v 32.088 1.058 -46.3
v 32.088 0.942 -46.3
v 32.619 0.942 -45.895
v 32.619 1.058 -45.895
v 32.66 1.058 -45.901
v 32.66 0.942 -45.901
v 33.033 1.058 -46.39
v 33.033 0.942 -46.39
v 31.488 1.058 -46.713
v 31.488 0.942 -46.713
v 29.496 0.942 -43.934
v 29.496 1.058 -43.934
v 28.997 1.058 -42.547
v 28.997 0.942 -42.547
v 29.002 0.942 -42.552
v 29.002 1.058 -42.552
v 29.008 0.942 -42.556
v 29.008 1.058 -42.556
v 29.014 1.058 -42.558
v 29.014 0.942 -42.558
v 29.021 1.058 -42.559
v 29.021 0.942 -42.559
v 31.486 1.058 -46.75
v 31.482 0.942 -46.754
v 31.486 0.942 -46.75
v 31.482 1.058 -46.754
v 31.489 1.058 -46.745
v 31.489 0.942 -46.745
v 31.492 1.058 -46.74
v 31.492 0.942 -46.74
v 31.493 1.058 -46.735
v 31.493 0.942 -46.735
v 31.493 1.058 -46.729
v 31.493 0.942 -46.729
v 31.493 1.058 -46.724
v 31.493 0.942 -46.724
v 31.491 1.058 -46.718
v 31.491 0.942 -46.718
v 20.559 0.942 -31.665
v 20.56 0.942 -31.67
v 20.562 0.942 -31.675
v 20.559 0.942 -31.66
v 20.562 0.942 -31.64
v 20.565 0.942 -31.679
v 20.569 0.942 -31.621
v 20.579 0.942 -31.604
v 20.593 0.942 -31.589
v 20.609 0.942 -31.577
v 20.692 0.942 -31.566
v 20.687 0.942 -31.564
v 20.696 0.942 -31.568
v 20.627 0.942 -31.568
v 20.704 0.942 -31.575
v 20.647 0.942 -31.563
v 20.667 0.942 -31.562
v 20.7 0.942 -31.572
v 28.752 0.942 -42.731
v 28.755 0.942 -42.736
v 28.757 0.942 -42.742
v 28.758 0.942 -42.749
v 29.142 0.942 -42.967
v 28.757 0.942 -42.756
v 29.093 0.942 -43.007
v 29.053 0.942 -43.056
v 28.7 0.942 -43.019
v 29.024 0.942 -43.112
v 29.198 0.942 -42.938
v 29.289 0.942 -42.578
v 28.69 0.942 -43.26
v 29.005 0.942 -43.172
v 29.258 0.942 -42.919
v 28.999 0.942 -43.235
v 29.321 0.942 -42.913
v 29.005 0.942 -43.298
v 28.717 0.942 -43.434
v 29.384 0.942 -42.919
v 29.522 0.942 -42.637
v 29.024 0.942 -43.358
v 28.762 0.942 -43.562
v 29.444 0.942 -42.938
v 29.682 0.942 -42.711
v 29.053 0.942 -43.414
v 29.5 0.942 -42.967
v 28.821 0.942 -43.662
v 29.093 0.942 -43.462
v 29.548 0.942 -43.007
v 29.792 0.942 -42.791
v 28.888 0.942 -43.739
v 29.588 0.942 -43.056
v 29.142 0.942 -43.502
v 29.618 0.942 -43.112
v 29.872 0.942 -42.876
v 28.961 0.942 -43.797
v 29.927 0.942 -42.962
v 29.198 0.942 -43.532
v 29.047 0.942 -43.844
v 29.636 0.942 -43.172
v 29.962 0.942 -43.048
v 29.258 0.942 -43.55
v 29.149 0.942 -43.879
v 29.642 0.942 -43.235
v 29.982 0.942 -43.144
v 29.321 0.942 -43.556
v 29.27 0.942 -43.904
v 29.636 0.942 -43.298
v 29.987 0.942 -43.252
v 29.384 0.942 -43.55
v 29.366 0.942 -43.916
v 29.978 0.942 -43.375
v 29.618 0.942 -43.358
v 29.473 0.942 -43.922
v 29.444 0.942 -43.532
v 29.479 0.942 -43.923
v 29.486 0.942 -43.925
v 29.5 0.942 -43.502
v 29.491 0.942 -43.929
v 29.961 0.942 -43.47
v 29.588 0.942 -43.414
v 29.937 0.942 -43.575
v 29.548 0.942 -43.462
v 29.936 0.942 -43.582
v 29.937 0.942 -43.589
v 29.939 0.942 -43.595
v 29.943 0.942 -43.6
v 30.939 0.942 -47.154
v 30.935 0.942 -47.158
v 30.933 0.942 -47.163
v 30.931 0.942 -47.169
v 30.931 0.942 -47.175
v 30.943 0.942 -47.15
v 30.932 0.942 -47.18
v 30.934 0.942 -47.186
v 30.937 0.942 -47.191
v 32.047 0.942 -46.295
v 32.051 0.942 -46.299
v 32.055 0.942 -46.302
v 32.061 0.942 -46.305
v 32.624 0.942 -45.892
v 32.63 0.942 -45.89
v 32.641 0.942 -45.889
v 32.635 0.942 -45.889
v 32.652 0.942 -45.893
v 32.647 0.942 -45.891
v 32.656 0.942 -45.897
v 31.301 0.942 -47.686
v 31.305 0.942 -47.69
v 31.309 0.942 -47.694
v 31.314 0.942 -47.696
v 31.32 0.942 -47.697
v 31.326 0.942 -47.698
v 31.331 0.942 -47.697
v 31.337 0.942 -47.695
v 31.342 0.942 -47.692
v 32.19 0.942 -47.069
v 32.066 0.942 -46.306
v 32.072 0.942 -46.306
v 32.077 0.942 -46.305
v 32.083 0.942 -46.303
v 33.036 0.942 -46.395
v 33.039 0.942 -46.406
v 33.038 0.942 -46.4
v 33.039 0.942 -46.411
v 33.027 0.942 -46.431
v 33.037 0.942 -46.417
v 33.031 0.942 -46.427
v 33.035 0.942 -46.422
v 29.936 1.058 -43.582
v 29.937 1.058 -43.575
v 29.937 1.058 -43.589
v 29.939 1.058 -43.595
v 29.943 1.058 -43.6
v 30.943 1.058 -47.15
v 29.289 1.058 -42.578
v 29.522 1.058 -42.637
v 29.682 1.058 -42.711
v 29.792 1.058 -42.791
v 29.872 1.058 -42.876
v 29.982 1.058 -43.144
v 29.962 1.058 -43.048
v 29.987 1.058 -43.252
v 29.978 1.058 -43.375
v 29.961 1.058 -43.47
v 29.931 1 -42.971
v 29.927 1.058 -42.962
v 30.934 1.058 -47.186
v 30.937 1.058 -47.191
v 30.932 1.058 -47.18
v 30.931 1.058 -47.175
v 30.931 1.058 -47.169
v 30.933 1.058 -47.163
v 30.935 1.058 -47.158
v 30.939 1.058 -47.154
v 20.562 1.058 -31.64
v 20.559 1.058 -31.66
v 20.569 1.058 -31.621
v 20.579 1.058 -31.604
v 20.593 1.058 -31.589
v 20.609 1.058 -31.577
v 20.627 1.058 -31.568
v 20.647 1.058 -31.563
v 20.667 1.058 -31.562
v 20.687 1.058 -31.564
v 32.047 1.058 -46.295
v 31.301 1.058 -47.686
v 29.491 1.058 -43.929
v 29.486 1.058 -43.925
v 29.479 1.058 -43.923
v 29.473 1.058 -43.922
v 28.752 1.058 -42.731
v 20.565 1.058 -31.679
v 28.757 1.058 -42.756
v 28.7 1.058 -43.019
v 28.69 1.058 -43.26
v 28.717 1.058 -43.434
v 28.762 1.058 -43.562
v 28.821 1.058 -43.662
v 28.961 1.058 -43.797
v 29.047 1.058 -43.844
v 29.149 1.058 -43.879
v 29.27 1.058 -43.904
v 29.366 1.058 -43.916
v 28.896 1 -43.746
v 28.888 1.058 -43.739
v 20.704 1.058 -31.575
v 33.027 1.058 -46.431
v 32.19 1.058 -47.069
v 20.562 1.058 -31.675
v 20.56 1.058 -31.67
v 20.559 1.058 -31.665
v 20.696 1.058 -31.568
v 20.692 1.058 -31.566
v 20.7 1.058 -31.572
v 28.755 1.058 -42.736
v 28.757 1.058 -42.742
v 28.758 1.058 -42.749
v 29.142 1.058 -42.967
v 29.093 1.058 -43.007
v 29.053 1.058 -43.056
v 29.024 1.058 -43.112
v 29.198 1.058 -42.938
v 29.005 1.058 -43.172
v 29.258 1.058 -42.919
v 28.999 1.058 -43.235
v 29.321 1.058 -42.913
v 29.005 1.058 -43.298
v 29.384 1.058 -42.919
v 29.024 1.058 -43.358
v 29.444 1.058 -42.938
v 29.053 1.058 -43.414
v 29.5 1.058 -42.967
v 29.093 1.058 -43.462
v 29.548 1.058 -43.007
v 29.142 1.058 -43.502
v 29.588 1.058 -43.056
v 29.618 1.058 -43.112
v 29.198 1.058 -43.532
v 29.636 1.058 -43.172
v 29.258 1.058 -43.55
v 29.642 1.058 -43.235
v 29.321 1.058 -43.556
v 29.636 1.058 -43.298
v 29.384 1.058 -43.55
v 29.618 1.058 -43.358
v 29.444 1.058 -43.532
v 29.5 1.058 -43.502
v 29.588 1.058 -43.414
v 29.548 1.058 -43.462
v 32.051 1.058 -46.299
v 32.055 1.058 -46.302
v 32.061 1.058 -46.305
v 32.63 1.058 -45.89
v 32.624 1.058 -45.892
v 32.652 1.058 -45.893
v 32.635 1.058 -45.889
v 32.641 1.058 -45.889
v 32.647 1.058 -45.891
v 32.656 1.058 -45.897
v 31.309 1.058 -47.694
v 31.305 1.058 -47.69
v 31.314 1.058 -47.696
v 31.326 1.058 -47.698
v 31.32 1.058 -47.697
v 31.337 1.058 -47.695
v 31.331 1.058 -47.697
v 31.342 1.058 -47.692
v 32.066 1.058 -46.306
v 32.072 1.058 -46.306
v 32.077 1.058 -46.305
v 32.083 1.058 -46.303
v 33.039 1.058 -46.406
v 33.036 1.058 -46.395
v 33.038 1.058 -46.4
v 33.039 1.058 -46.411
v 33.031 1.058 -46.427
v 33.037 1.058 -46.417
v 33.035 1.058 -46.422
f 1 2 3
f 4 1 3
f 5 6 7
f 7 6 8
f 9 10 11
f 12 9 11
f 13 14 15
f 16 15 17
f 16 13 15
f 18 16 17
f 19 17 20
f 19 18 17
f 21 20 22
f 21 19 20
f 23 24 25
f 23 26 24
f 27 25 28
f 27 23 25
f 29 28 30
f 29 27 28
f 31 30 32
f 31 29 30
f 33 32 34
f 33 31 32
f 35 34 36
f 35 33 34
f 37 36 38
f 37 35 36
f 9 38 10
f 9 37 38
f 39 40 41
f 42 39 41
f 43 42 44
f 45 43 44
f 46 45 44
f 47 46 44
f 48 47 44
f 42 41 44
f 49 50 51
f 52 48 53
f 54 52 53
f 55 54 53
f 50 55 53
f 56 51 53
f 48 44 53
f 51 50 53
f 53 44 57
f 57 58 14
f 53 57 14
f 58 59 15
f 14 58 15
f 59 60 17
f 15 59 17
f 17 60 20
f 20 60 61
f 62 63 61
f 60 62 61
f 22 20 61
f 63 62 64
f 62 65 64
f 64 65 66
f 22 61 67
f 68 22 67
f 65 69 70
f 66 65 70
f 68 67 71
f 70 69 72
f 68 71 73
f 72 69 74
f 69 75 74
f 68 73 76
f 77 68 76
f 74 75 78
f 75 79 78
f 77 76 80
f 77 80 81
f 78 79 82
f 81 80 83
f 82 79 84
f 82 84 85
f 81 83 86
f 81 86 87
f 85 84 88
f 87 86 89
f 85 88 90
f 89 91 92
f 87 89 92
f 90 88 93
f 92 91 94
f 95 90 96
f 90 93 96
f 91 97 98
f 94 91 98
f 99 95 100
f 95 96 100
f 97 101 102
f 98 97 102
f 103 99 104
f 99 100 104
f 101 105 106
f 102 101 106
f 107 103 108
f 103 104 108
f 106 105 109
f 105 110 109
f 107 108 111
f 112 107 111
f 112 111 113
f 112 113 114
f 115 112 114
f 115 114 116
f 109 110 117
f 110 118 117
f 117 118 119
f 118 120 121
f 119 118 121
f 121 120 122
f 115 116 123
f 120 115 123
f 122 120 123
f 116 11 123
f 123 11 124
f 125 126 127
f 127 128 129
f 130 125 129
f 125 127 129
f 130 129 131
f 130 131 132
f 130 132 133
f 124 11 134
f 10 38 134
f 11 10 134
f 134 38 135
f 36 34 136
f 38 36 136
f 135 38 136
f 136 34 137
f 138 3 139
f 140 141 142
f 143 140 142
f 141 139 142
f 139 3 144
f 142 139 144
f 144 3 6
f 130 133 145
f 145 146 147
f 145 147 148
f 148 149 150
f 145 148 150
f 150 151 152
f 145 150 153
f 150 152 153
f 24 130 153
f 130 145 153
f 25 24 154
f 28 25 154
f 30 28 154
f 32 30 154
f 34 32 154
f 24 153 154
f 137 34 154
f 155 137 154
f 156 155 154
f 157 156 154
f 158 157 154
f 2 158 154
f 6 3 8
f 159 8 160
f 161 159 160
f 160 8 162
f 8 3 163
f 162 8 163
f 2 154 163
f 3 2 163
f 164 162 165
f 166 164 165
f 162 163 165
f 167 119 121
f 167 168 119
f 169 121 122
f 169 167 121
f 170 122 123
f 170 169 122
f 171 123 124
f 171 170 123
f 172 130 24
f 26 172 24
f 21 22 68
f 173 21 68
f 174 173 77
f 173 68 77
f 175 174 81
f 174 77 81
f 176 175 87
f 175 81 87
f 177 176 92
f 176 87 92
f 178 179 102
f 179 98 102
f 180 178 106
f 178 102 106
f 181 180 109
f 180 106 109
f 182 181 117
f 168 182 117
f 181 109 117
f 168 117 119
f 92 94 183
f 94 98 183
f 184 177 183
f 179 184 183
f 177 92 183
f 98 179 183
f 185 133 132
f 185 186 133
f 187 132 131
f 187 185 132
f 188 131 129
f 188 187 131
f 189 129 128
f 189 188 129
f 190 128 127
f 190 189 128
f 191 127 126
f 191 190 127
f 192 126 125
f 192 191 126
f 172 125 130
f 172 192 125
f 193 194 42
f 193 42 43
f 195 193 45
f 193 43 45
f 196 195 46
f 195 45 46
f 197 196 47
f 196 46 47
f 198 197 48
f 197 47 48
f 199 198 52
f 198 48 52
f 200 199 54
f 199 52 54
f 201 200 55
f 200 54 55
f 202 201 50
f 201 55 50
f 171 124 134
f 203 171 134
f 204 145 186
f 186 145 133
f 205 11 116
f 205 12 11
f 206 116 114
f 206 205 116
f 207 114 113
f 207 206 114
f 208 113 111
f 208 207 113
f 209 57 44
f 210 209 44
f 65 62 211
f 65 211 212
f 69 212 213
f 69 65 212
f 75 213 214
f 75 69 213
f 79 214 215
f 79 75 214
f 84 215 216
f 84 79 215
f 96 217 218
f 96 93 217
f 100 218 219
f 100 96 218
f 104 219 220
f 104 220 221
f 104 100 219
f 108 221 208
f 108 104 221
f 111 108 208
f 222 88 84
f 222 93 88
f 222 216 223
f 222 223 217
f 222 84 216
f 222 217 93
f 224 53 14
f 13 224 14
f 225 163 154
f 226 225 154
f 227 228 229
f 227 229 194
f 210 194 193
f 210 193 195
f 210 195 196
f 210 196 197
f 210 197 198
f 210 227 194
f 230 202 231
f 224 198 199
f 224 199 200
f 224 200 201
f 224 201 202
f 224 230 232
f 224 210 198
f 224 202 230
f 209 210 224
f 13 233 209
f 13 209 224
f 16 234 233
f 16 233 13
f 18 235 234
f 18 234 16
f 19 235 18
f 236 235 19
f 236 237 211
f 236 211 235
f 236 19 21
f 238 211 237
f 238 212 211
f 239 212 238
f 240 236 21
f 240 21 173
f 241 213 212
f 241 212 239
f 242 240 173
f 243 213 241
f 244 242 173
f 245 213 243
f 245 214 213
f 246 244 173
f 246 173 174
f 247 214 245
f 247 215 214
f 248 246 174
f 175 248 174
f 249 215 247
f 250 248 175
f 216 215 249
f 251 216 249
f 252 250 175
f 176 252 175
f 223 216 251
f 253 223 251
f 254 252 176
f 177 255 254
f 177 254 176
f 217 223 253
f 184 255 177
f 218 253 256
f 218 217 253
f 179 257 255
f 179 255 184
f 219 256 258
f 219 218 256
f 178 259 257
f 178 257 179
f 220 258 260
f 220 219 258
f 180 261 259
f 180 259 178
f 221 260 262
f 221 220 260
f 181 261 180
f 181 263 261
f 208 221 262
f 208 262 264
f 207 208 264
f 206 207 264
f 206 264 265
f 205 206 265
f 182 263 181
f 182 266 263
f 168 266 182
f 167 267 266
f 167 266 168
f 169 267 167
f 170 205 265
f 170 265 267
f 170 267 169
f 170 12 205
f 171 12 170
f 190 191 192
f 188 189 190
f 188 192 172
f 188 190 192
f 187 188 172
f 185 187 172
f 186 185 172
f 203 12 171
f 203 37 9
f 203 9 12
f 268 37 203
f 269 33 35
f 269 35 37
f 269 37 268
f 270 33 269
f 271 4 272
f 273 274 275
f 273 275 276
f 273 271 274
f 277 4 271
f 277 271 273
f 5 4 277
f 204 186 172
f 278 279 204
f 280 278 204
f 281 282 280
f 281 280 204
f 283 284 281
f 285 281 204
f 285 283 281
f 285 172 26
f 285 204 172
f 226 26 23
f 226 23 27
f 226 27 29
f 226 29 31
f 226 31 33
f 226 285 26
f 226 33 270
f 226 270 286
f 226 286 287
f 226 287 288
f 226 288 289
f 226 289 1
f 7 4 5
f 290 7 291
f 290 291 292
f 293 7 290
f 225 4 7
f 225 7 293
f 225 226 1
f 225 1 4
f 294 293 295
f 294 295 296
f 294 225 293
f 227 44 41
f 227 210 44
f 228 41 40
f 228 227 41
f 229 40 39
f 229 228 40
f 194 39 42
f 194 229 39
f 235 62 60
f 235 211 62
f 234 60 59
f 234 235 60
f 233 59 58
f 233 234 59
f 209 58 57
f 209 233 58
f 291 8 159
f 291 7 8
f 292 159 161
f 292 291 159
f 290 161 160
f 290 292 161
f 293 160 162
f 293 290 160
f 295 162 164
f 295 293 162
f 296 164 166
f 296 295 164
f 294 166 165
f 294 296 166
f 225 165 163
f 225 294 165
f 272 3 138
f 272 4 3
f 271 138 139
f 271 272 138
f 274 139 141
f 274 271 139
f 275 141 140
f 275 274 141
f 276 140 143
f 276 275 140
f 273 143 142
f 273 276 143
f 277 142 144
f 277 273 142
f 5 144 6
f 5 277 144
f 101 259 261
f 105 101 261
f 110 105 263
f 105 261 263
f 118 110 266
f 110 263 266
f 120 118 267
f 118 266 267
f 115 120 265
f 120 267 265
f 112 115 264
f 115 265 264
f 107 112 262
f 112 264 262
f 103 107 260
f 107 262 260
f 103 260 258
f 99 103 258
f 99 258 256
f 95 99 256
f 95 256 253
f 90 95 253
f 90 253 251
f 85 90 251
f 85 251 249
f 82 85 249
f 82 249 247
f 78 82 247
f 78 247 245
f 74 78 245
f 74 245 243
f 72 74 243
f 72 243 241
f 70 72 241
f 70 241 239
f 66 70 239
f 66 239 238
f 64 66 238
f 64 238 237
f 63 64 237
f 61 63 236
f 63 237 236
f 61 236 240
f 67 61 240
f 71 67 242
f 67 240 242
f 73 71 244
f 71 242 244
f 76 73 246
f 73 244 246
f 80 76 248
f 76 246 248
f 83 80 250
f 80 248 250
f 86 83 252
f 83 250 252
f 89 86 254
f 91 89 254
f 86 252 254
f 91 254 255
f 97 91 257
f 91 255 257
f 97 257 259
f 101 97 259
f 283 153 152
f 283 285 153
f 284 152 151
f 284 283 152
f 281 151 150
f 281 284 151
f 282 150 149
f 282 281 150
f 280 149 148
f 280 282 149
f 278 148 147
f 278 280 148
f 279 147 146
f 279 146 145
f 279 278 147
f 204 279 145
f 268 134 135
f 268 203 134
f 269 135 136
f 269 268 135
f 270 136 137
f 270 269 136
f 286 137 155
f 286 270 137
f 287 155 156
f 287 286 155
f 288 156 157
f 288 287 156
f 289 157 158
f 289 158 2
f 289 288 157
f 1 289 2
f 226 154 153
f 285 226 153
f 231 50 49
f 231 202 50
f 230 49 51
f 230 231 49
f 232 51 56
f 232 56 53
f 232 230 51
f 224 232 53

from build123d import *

# Parameters (mm, degrees)
BOSS_EXTRUDE1_DEPTH = 2
FILLET2_R           = 0.5
SKETCH2_R           = 5.5
CUT_EXTRUDE1_DEPTH  = 3.0000001
SCALE1_SCALE        = 0.05848


with BuildPart() as part:
    # Sketch1 → Boss-Extrude1 (new body)
    with BuildSketch(Plane(origin=(0, 0, 0), x_dir=(1, 0, 0), z_dir=(0, 1, 0))):
        with BuildLine():
            Line((92.085110733, 127.103938413), (77.178124527, 138.062250462))
            Line((77.178124527, 138.062250462), (70.360301054, 128.787719859))
            Line((70.360301054, 128.787719859), (80.370912811, 121.428793922))
            Line((80.370912811, 121.428793922), (45.876712151, 73.307436464))
            add(Edge.make_bspline(
                [(33.451049577, 53.126345945), (31.215883749, 60.494948343), (32.447141404, 70.446648696), (40.862115825, 73.16760251), (45.876712151, 73.307436464)],
                knots=[0, 0, 0, 0, 0.641849019, 1, 1, 1, 1], degree=3))
            Line((33.451049577, 53.126345945), (-106.799876202, -136.181201423))
            ThreePointArc((-106.799876202, -136.181201423), (-106.088492795, -137.707043736), (-104.423962902, -137.959236822))
            Line((-104.423962902, -137.959236822), (37.646178322, 49.986884833))
            add(Edge.make_bspline(
                [(37.646178322, 49.986884833), (45.3460396, 49.920523216), (54.546555656, 53.908359677), (54.783891194, 62.749120731), (53.503843784, 67.599606116)],
                knots=[0, 0, 0, 0, 0.641849019, 1, 1, 1, 1], degree=3))
            Line((53.503843784, 67.599606116), (89.943937285, 114.264737729))
            Line((89.943937285, 114.264737729), (99.827328979, 106.735813017))
            Line((99.827328979, 106.735813017), (106.802651201, 115.89247806))
            Line((106.802651201, 115.89247806), (92.085110733, 127.103938413))
        make_face()
    extrude(amount=BOSS_EXTRUDE1_DEPTH)

    # Fillet2
    fillet2_edges = [part.edges().sort_by_distance(p)[0] for p in [
        (-104.423962902, 1, 137.959236822),
        (-106.799876202, 1, 136.181201423),
        (33.451049577, 1, -53.126345945),
        (37.646178322, 1, -49.986884833),
        (45.876712151, 1, -73.307436464),
        (53.503843784, 1, -67.599606116),
        (99.827328979, 1, -106.735813017),
        (89.943937285, 1, -114.264737729),
        (80.370912811, 1, -121.428793922),
        (70.360301054, 1, -128.787719859),
        (77.178124527, 1, -138.062250462),
        (106.802651201, 1, -115.89247806),
    ]]
    fillet(fillet2_edges, radius=FILLET2_R)

    # Sketch2 → Cut-Extrude1 (cut, through all)
    with BuildSketch(Plane(origin=(0, 2, 0), x_dir=(1, 0, 0), z_dir=(0, 1, 0))):
        with Locations((43.025259326, 61.547339532)):
            Circle(SKETCH2_R)
    extrude(amount=-CUT_EXTRUDE1_DEPTH, mode=Mode.SUBTRACT)


with BuildPart() as part_1:
    # Scale1: scaled about (28.469603302, 1, -42.097394776)
    add(part.part.scale(SCALE1_SCALE).moved(Location((26.804700901, 0.94152, -39.635539129))))


solid = part_1.part
